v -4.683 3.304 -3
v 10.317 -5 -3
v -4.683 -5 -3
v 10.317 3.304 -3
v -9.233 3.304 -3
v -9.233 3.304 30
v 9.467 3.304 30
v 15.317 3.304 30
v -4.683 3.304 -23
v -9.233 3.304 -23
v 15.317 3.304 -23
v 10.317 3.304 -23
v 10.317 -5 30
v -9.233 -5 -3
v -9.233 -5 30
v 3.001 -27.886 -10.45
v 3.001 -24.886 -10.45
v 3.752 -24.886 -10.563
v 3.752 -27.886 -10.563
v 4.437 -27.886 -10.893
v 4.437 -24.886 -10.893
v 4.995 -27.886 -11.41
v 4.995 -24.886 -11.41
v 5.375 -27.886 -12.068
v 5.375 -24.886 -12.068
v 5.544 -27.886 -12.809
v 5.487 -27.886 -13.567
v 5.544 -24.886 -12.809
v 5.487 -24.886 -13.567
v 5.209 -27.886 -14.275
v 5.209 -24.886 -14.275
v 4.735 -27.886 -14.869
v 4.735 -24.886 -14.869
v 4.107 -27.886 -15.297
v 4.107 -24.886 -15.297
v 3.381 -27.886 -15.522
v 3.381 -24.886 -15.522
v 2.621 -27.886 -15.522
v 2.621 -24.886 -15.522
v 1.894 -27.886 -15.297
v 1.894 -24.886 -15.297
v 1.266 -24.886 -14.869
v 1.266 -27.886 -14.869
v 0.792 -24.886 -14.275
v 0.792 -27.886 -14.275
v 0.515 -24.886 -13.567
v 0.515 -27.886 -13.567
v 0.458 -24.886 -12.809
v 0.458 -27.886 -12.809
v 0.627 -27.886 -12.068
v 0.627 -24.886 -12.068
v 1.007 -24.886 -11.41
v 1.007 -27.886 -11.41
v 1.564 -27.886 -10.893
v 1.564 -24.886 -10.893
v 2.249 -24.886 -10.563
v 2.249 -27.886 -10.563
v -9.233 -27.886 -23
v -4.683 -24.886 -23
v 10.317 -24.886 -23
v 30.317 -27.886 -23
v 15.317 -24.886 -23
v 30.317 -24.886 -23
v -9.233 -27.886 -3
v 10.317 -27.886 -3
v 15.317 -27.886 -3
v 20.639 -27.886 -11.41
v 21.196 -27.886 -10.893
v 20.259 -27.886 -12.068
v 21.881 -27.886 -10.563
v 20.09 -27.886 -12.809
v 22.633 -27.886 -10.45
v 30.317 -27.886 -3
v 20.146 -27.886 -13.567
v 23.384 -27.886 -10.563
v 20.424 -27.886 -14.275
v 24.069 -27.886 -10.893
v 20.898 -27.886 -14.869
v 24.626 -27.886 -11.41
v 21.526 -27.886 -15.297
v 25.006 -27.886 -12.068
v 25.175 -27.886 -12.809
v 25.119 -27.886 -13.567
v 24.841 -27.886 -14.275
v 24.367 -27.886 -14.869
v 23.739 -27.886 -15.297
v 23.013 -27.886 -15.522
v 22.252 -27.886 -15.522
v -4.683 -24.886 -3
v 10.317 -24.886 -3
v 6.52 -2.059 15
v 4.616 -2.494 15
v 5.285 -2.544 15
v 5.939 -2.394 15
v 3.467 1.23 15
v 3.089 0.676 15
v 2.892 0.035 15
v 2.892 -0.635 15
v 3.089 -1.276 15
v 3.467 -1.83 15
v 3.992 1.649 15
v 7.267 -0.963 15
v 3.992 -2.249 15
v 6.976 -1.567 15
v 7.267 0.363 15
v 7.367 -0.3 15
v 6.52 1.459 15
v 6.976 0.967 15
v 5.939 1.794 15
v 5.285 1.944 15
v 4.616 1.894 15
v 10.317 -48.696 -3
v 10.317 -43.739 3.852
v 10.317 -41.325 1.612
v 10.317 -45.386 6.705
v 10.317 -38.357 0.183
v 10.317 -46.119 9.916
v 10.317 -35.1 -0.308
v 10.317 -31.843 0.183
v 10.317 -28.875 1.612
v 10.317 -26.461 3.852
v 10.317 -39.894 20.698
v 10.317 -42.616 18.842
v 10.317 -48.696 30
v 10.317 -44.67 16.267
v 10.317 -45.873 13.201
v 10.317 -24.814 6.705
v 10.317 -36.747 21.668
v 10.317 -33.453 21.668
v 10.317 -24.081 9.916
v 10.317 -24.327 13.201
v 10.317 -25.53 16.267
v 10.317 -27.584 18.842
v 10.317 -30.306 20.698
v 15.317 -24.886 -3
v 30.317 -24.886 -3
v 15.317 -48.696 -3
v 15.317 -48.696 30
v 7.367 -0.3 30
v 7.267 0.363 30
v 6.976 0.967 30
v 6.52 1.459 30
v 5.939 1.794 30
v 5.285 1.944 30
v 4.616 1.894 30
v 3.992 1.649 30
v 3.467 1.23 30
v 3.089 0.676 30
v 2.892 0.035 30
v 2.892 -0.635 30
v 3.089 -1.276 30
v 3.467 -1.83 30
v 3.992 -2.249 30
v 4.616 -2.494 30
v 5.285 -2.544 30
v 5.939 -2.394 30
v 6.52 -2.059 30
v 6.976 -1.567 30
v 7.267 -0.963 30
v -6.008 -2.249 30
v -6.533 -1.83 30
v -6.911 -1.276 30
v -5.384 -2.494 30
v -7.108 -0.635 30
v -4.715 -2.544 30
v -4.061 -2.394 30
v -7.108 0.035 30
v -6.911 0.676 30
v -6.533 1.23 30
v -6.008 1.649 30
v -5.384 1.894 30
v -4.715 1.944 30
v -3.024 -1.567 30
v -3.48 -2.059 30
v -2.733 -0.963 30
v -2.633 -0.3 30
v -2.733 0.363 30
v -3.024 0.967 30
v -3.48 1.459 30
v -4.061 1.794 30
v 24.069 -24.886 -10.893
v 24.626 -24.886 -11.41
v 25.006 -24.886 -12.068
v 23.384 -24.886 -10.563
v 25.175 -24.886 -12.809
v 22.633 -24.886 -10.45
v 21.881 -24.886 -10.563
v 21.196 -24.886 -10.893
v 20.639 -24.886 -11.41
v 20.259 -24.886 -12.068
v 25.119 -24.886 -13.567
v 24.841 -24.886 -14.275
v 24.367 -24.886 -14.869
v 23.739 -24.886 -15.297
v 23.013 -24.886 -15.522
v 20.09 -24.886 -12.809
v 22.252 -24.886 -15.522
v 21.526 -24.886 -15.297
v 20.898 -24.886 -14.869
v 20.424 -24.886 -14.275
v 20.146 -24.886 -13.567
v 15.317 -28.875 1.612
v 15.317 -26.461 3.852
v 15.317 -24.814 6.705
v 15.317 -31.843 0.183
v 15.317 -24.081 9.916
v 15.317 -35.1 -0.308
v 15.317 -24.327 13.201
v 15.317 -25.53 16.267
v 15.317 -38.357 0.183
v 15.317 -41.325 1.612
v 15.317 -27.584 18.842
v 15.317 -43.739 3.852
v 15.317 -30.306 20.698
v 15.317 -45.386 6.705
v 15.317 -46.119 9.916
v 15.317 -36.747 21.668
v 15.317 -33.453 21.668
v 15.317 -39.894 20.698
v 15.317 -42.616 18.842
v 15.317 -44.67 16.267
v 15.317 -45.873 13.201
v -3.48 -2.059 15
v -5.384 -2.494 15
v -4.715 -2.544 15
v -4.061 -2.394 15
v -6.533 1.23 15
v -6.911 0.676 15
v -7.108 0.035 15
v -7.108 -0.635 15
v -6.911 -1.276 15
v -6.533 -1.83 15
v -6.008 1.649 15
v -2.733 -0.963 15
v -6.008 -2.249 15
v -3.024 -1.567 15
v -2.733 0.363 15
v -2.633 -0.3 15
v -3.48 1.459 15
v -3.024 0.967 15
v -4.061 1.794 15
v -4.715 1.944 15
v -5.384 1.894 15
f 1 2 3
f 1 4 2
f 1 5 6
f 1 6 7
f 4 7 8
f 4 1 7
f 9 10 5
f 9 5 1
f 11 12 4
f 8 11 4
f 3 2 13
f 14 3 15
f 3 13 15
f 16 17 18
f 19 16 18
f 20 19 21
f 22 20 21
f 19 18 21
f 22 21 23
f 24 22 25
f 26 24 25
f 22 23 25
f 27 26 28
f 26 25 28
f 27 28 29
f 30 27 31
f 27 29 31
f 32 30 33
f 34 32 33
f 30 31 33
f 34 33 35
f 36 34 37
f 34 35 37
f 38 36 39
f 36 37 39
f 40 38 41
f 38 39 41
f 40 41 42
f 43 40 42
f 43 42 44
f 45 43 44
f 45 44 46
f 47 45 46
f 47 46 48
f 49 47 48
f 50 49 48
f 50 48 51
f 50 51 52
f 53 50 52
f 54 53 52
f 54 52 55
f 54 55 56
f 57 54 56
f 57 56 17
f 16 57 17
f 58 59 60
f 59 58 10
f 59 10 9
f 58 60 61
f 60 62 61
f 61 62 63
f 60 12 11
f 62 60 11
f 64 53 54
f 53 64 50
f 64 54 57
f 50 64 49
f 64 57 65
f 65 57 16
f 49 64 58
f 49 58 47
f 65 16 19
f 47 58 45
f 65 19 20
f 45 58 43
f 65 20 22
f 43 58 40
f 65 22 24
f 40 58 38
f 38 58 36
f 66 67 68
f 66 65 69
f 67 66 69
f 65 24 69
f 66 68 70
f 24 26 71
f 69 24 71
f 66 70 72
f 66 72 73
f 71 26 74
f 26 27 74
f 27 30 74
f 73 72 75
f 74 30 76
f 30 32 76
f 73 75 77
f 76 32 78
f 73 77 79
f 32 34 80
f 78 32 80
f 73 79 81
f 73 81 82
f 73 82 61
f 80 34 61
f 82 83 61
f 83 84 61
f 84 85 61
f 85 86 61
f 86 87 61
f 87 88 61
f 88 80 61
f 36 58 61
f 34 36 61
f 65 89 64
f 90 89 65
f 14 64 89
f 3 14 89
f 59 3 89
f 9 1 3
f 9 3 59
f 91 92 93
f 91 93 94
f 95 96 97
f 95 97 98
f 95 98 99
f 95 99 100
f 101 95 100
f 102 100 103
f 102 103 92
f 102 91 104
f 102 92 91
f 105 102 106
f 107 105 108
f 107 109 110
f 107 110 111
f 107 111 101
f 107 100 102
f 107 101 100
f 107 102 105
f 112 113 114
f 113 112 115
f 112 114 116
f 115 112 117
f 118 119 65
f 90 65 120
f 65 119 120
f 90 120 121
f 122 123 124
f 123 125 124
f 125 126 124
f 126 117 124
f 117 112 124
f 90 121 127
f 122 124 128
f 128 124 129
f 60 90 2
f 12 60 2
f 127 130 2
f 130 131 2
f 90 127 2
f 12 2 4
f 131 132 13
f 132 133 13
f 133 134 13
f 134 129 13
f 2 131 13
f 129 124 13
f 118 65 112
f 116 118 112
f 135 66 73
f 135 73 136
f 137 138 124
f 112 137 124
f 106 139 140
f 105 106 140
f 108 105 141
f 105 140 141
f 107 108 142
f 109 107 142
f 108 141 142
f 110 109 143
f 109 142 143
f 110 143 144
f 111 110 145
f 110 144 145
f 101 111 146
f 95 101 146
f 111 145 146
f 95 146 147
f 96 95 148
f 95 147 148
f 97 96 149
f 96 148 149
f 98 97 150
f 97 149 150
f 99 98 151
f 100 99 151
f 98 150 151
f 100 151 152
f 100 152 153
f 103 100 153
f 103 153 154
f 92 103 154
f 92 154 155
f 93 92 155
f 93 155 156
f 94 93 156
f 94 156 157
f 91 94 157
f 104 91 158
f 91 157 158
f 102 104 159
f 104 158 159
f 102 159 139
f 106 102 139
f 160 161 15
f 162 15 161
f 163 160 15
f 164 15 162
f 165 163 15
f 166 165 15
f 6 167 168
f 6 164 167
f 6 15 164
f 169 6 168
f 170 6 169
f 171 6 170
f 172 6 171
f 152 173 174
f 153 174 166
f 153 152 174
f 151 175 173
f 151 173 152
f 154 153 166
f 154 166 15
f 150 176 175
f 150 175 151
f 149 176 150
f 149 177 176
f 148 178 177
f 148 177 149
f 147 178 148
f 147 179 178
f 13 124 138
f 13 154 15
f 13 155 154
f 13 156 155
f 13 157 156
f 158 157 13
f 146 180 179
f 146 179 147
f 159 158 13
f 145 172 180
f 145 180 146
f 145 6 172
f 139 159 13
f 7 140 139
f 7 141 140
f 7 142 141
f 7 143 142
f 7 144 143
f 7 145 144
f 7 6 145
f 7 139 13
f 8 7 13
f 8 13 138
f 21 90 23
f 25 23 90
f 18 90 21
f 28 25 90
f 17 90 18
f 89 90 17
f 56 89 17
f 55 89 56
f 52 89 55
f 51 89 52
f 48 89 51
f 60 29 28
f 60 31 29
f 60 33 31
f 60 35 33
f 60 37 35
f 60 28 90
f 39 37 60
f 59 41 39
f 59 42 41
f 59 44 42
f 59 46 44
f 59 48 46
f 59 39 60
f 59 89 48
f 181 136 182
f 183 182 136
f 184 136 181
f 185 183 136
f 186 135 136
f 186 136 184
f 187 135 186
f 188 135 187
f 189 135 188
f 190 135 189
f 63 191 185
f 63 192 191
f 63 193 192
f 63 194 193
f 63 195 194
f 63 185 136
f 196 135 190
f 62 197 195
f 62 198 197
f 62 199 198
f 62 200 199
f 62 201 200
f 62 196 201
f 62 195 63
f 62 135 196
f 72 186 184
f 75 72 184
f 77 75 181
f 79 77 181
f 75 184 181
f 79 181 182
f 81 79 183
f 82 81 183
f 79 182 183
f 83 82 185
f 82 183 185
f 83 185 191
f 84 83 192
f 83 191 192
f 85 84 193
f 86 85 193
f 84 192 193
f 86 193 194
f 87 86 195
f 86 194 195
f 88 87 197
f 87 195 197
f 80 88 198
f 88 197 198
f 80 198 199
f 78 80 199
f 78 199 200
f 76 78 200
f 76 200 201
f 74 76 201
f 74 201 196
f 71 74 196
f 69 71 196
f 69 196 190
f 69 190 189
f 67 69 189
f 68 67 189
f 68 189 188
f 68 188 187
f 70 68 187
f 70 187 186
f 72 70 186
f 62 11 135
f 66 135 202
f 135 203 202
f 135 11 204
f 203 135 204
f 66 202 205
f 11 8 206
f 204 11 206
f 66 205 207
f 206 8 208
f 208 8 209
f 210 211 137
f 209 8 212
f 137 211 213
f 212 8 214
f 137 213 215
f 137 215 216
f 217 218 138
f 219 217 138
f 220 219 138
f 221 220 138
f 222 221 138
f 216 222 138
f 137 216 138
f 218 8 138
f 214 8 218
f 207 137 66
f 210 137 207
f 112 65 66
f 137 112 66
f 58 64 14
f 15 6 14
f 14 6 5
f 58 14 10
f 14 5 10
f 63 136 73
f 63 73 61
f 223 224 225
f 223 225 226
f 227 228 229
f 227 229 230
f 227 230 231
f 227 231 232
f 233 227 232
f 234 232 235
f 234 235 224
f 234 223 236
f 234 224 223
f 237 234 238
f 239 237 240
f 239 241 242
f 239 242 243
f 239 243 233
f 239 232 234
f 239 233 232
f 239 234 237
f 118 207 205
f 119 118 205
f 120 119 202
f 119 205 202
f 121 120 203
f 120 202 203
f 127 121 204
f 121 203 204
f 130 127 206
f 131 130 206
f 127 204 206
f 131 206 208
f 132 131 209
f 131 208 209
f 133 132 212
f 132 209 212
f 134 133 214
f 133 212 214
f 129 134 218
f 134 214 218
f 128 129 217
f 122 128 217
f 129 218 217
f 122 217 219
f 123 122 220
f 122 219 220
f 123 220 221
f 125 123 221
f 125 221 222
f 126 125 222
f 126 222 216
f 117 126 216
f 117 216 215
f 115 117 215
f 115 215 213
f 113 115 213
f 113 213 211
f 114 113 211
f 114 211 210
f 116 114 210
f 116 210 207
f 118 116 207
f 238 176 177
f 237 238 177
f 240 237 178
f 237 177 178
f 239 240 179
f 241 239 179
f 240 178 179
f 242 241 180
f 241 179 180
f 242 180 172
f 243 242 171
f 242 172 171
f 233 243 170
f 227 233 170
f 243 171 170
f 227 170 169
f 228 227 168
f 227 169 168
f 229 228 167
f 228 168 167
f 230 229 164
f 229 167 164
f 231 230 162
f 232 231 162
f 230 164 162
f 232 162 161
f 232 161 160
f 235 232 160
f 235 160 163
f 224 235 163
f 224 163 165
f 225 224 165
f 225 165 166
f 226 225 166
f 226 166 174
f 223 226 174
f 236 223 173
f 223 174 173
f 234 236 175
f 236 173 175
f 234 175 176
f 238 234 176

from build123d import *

# Parameters (mm, degrees)
SKETCH_1_W           = 22.333333334
SKETCH_1_H           = 10
EXTRUDE_1_DEPTH      = 30
SKETCH_4_W           = 1.083333334
SKETCH_4_H           = 30
CUT_EXTRUDE_1_DEPTH  = 30
SKETCH_3_R           = 2.25
CUT_EXTRUDE_2_DEPTH  = 15
SKETCH_5_OUTSIDE_W   = 30.87
SKETCH_5_OUTSIDE_H   = 19.62
SKETCH_5_OUTSIDE_W_2 = 18.7
SKETCH_5_OUTSIDE_H_2 = 8.315719237
CUT_EXTRUDE_3_DEPTH  = 30
SKETCH_10_W          = 18.7
SKETCH_10_H          = 8.304405234
EXTRUDE_2_DEPTH      = 18
SKETCH_11_W          = 20
SKETCH_11_H          = 2.687046706
CUT_EXTRUDE_5_DEPTH  = 36.702801011
CUT_EXTRUDE_6_DEPTH  = 32.955789688
SKETCH_13_W          = 18.7
SKETCH_13_H          = 5
EXTRUDE_3_DEPTH      = 5.617358528
SKETCH_15_W          = 18.7
SKETCH_15_H          = 25
CUT_EXTRUDE_7_DEPTH  = 33.535840608
SKETCH_18_W          = 28
SKETCH_18_H          = 8.304405234
EXTRUDE_5_DEPTH      = 0.85
SKETCH_20_W          = 5
SKETCH_20_H          = 28
EXTRUDE_6_DEPTH      = 52
EXTRUDE_7_DEPTH      = 5
SKETCH_22_R          = 10
CUT_EXTRUDE_8_DEPTH  = 63.24117166
EXTRUDE_8_DEPTH      = 20
SKETCH_30_W          = 5
SKETCH_30_H          = 20
CUT_EXTRUDE_10_DEPTH = 20.81
EXTRUDE_9_DEPTH      = 15
EXTRUDE_9_DEPTH_BACK = 20
SKETCH_31_W          = 20
SKETCH_31_H          = 3
SKETCH_32_R          = 2.55
CUT_EXTRUDE_11_DEPTH = 52.125105162
SKETCH_33_W          = 4.55
SKETCH_33_H          = 20
EXTRUDE_10_DEPTH     = 31.19
SKETCH_34_R          = 11.05
CUT_EXTRUDE_12_DEPTH = 10


with BuildPart() as part:
    # 草图1 → 凸台-拉伸1 (new body)
    with BuildSketch(Plane.XY):
        Rectangle(SKETCH_1_W, SKETCH_1_H)
    extrude(amount=EXTRUDE_1_DEPTH)

    # 草图4 → 切除-拉伸1 (cut)
    with BuildSketch(Plane.XZ.offset(5)):
        with Locations((-10.625, 15)):
            Rectangle(SKETCH_4_W, SKETCH_4_H)
    extrude(amount=-CUT_EXTRUDE_1_DEPTH, mode=Mode.SUBTRACT)

    # 草图3 → 切除-拉伸2 (cut)
    with BuildSketch(Plane.XY.offset(30)):
        with Locations((-4.883333333, -0.3)):
            Circle(SKETCH_3_R)
        with Locations((5.116666667, -0.3)):
            Circle(SKETCH_3_R)
    extrude(amount=-CUT_EXTRUDE_2_DEPTH, mode=Mode.SUBTRACT)

    # 草图5 outside → 切除-拉伸3 (cut)
    with BuildSketch(Plane.XY.offset(30)):
        with Locations((0.542, 0)):
            Rectangle(SKETCH_5_OUTSIDE_W, SKETCH_5_OUTSIDE_H)
        with Locations((0.116666667, -0.853454385)):
            Rectangle(SKETCH_5_OUTSIDE_W_2, SKETCH_5_OUTSIDE_H_2, mode=Mode.SUBTRACT)
    extrude(amount=-CUT_EXTRUDE_3_DEPTH, mode=Mode.SUBTRACT)

    # 草图10 → 凸台-拉伸2 (add)
    with BuildSketch(Plane(origin=(0, 0, 0), x_dir=(-1, 0, 0), z_dir=(0, 0, -1))):
        with Locations((-0.116666667, -0.847797383)):
            Rectangle(SKETCH_10_W, SKETCH_10_H)
    extrude(amount=EXTRUDE_2_DEPTH)

    # 草图11 → 切除-拉伸5 (cut, through all)
    with BuildSketch(Plane(origin=(9.466666667, 0, 0), x_dir=(0, 0, -1), z_dir=(1, 0, 0))):
        with Locations((8, -3.656476647)):
            Rectangle(SKETCH_11_W, SKETCH_11_H)
    extrude(amount=-CUT_EXTRUDE_5_DEPTH, mode=Mode.SUBTRACT)

    # 草图12 → 切除-拉伸6 (cut, through all)
    with BuildSketch(Plane.XZ.offset(2.312953294)):
        with BuildLine():
            ThreePointArc((-2.185193673, -12.99813966), (-4.733333333, -10.45), (-7.281472993, -12.99813966))
            Line((-7.281472993, -12.99813966), (-2.185193673, -12.99813966))
        make_face()
        with BuildLine():
            Line((-2.185193673, -12.99813966), (-7.281472993, -12.99813966))
            ThreePointArc((-7.281472993, -12.99813966), (-4.733333333, -15.54627932), (-2.185193673, -12.99813966))
        make_face()
        with BuildLine():
            ThreePointArc((7.514806327, -12.99813966), (4.966666667, -10.45), (2.418527007, -12.99813966))
            Line((2.418527007, -12.99813966), (7.514806327, -12.99813966))
        make_face()
        with BuildLine():
            Line((7.514806327, -12.99813966), (2.418527007, -12.99813966))
            ThreePointArc((2.418527007, -12.99813966), (4.966666667, -15.54627932), (7.514806327, -12.99813966))
        make_face()
    extrude(amount=-CUT_EXTRUDE_6_DEPTH, mode=Mode.SUBTRACT)

    # 草图13 → 凸台-拉伸3 (add)
    with BuildSketch(Plane(origin=(0, 3.304405234, 0), x_dir=(1, 0, 0), z_dir=(0, 1, 0))):
        with Locations((0.116666667, 20.5)):
            Rectangle(SKETCH_13_W, SKETCH_13_H)
    extrude(amount=-EXTRUDE_3_DEPTH)

    # 草图15 → 切除-拉伸7 (cut, through all)
    with BuildSketch(Plane.XZ.offset(5)):
        with Locations((0.116666667, -10.5)):
            Rectangle(SKETCH_15_W, SKETCH_15_H)
    extrude(amount=-CUT_EXTRUDE_7_DEPTH, mode=Mode.SUBTRACT)

    # 草图18 → 凸台-拉伸5 (add)
    with BuildSketch(Plane(origin=(9.466666667, 0, 0), x_dir=(0, 0, -1), z_dir=(1, 0, 0))):
        with Locations((-16, -0.847797383)):
            Rectangle(SKETCH_18_W, SKETCH_18_H)
    extrude(amount=EXTRUDE_5_DEPTH)

    # 草图20 → 凸台-拉伸6 (add)
    with BuildSketch(Plane(origin=(0, 3.304405234, 0), x_dir=(1, 0, 0), z_dir=(0, 1, 0))):
        with Locations((12.816666667, -16)):
            Rectangle(SKETCH_20_W, SKETCH_20_H)
    extrude(amount=-EXTRUDE_6_DEPTH)

    # 草图23 → 凸台-拉伸7 (add)
    with BuildSketch(Plane(origin=(0, 0, 2), x_dir=(-1, 0, 0), z_dir=(0, 0, -1))):
        Polygon((9.233333333, 3.304405234), (-15.316666667, 3.304405234), (-15.316666667, -48.695594766), (-10.316666667, -48.695594766), (-10.316666667, -5), (9.233333333, -5), align=None)
    extrude(amount=EXTRUDE_7_DEPTH)

    # 草图22 → 切除-拉伸8 (cut, through all)
    with BuildSketch(Plane(origin=(15.316666667, 0, 0), x_dir=(0, 0, -1), z_dir=(1, 0, 0))):
        with Locations((-10.741872617, -35.1)):
            Circle(SKETCH_22_R)
    extrude(amount=-CUT_EXTRUDE_8_DEPTH, mode=Mode.SUBTRACT)

    # 草图24 → 凸台-拉伸8 (add)
    with BuildSketch(Plane(origin=(0, 0, -3), x_dir=(-1, 0, 0), z_dir=(0, 0, -1))):
        Polygon((-10.316666667, -5), (-10.316666667, 3.304405234), (-15.316666667, 3.304405234), (-15.316666667, -48.695594766), (-10.316666667, -48.695594766), align=None)
    extrude(amount=EXTRUDE_8_DEPTH)

    # 草图30 → 切除-拉伸10 (cut)
    with BuildSketch(Plane.XZ.offset(48.695594766)):
        with Locations((12.816666667, -13)):
            Rectangle(SKETCH_30_W, SKETCH_30_H)
    extrude(amount=-CUT_EXTRUDE_10_DEPTH, mode=Mode.SUBTRACT)

    # 草图31 → 凸台-拉伸9 (add, two sides: drawn at the far end of the back side and taken through both)
    with BuildSketch(Plane(origin=(15.316666667, 0, 0), x_dir=(0, 0, -1), z_dir=(1, 0, 0)).offset(-EXTRUDE_9_DEPTH_BACK)):
        with Locations((13, -26.385594766)):
            Rectangle(SKETCH_31_W, SKETCH_31_H)
    extrude(amount=EXTRUDE_9_DEPTH + EXTRUDE_9_DEPTH_BACK)

    # 草图32 → 切除-拉伸11 (cut, through all)
    with BuildSketch(Plane(origin=(0, -24.885594766, 0), x_dir=(1, 0, 0), z_dir=(0, 1, 0))):
        with Locations(Location((3.000831302, 13, 0), (0, 0, 270))):
            Circle(SKETCH_32_R)
        with Locations(Location((22.632502032, 13, 0), (0, 0, 270))):
            Circle(SKETCH_32_R)
    extrude(amount=-CUT_EXTRUDE_11_DEPTH, mode=Mode.SUBTRACT)

    # 草图33 → 凸台-拉伸10 (add)
    with BuildSketch(Plane(origin=(0, 3.304405234, 0), x_dir=(1, 0, 0), z_dir=(0, 1, 0))):
        with Locations((-6.958333333, 13)):
            Rectangle(SKETCH_33_W, SKETCH_33_H)
    extrude(amount=-EXTRUDE_10_DEPTH)

    # 草图34 → 切除-拉伸12 (cut)
    with BuildSketch(Plane(origin=(15.316666667, 0, 0), x_dir=(0, 0, -1), z_dir=(1, 0, 0))):
        with Locations((-10.741872617, -35.1)):
            Circle(SKETCH_34_R)
    extrude(amount=-CUT_EXTRUDE_12_DEPTH, mode=Mode.SUBTRACT)


solid = part.part
